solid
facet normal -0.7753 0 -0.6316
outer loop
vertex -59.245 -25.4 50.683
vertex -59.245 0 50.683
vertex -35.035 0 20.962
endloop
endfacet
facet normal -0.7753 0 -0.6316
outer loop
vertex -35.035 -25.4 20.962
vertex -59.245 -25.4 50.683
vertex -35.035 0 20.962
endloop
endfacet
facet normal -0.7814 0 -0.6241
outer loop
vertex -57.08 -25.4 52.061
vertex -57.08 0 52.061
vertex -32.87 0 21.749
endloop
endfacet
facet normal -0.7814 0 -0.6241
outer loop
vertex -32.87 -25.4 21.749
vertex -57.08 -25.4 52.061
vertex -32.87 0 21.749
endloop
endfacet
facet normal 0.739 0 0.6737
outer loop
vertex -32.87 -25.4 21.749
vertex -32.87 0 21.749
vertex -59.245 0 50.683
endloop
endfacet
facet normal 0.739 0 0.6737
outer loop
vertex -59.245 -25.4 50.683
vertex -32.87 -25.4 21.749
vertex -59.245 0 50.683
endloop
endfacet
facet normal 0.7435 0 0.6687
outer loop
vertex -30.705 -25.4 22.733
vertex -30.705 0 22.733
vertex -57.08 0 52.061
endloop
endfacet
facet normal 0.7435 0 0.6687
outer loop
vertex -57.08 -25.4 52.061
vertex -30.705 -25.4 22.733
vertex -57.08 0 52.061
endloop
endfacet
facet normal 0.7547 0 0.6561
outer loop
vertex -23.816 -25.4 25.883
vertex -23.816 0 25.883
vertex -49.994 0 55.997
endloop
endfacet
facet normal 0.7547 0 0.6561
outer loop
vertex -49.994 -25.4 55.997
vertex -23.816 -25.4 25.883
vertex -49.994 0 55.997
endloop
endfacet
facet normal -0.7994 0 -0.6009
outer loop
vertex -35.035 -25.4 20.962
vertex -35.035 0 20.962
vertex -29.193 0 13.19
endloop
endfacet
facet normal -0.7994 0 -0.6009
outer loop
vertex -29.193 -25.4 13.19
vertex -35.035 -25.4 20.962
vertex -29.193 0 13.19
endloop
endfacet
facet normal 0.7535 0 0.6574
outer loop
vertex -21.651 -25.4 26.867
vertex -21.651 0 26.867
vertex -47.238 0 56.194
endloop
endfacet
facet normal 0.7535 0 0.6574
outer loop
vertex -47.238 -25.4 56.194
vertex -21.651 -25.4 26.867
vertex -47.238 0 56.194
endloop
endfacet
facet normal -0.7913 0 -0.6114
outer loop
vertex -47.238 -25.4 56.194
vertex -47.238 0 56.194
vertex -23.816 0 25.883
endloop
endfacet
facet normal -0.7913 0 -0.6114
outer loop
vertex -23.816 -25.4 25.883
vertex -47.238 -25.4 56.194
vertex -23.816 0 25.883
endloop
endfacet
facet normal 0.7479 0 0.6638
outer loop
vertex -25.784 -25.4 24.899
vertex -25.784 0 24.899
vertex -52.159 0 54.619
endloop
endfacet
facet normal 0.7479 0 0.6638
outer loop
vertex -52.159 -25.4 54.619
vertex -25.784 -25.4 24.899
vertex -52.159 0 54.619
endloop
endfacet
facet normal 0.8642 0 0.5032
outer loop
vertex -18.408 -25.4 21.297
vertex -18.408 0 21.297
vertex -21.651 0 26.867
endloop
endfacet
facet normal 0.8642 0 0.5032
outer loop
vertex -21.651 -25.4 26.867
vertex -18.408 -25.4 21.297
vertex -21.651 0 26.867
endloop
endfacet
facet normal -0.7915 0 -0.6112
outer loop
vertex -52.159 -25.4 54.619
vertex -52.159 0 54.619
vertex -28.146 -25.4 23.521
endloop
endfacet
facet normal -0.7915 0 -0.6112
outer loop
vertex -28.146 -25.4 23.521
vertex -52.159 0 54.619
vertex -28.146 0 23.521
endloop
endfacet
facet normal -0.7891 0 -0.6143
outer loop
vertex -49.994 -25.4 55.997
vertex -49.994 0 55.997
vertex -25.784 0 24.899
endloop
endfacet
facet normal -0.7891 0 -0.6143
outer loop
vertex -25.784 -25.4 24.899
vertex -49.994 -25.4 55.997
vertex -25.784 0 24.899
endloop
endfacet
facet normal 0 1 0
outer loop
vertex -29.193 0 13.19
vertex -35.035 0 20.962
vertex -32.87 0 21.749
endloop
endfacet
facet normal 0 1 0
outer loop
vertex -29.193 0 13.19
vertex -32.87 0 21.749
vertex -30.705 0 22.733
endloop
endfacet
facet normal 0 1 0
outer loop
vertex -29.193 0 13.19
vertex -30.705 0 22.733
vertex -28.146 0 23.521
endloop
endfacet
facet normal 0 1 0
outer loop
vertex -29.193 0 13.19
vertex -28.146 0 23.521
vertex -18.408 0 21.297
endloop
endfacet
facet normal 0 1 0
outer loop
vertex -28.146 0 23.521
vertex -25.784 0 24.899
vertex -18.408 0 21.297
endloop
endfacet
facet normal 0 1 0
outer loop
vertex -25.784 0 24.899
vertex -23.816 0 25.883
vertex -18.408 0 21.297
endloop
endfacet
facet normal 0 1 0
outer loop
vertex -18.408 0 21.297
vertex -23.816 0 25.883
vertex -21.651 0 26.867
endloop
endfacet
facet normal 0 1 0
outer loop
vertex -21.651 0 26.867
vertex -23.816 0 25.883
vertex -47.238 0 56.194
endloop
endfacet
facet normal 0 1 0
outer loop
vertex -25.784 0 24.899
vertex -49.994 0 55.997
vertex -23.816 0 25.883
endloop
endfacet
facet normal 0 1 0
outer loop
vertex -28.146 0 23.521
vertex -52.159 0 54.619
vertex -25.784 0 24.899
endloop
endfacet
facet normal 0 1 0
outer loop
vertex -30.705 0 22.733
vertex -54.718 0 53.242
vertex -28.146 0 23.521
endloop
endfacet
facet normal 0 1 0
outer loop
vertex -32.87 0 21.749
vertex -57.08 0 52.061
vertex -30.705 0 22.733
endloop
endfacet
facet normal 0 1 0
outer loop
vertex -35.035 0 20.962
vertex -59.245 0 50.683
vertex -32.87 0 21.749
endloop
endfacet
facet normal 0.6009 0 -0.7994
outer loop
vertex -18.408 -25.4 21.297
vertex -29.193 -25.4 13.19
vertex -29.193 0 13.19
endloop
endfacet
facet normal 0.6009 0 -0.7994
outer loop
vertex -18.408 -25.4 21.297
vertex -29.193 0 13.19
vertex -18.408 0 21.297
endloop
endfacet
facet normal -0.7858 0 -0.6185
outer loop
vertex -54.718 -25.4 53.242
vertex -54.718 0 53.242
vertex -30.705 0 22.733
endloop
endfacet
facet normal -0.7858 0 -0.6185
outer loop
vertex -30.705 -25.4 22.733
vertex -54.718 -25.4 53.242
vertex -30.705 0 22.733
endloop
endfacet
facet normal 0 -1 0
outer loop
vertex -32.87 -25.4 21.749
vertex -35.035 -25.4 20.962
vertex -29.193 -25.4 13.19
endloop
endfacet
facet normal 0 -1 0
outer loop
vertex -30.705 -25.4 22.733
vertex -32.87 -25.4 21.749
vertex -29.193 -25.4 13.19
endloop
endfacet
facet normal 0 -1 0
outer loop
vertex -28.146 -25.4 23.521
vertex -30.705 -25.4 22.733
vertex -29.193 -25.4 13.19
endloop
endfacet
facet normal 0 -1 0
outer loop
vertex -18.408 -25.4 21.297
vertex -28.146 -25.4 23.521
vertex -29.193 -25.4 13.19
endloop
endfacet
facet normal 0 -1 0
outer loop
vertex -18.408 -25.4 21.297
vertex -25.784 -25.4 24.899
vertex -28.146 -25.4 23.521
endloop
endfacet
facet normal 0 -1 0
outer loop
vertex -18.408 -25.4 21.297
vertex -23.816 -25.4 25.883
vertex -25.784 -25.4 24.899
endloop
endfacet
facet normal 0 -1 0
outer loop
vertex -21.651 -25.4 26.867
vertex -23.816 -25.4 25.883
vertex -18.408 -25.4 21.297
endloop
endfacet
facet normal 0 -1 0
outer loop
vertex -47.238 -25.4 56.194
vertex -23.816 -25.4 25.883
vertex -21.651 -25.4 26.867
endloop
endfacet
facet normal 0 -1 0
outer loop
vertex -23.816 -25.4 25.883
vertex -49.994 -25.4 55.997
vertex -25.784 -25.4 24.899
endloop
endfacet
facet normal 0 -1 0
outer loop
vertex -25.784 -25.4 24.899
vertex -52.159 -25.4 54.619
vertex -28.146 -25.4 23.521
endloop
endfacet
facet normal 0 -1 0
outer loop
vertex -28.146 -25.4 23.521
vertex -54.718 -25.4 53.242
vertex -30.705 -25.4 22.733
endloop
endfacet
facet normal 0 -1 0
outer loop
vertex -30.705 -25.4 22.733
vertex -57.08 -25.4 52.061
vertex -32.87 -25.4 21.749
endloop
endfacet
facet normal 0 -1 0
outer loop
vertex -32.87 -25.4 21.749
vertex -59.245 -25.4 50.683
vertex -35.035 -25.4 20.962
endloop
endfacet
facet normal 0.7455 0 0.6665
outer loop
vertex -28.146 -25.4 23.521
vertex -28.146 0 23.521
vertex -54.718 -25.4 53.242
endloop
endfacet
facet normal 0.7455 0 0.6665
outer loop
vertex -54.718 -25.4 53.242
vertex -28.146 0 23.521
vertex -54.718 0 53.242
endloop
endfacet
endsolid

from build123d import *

# Parameters (mm, degrees)
F1_DEPTH = 25.4
F2_DEPTH = 25.4


with BuildPart() as f1:
    # F0 (on Front) → F1 (new body)
    with BuildSketch(Plane.XZ):
        Polygon((-59.2448, 50.682843), (-35.03513, 20.962032), (-29.193482, 13.1901), (-18.408047, 21.296799), (-21.650923, 26.866825), (-47.238376, 56.193985), (-23.816016, 25.882695), (-49.993947, 55.997163), (-25.78428, 24.898561), (-52.159041, 54.619372), (-28.1462, 23.520775), (-54.717787, 53.241584), (-30.704945, 22.733469), (-57.079706, 52.060626), (-32.870036, 21.749334), align=None)
    extrude(amount=F1_DEPTH)

    # F0 (on Front) → F2 (join)
    with BuildSketch(Plane.XZ):
        Polygon((-59.2448, 50.682843), (-35.03513, 20.962032), (-29.193482, 13.1901), (-18.408047, 21.296799), (-21.650923, 26.866825), (-47.238376, 56.193985), (-23.816016, 25.882695), (-49.993947, 55.997163), (-25.78428, 24.898561), (-52.159041, 54.619372), (-28.1462, 23.520775), (-54.717787, 53.241584), (-30.704945, 22.733469), (-57.079706, 52.060626), (-32.870036, 21.749334), align=None)
    extrude(amount=F2_DEPTH)


solid = f1.part
